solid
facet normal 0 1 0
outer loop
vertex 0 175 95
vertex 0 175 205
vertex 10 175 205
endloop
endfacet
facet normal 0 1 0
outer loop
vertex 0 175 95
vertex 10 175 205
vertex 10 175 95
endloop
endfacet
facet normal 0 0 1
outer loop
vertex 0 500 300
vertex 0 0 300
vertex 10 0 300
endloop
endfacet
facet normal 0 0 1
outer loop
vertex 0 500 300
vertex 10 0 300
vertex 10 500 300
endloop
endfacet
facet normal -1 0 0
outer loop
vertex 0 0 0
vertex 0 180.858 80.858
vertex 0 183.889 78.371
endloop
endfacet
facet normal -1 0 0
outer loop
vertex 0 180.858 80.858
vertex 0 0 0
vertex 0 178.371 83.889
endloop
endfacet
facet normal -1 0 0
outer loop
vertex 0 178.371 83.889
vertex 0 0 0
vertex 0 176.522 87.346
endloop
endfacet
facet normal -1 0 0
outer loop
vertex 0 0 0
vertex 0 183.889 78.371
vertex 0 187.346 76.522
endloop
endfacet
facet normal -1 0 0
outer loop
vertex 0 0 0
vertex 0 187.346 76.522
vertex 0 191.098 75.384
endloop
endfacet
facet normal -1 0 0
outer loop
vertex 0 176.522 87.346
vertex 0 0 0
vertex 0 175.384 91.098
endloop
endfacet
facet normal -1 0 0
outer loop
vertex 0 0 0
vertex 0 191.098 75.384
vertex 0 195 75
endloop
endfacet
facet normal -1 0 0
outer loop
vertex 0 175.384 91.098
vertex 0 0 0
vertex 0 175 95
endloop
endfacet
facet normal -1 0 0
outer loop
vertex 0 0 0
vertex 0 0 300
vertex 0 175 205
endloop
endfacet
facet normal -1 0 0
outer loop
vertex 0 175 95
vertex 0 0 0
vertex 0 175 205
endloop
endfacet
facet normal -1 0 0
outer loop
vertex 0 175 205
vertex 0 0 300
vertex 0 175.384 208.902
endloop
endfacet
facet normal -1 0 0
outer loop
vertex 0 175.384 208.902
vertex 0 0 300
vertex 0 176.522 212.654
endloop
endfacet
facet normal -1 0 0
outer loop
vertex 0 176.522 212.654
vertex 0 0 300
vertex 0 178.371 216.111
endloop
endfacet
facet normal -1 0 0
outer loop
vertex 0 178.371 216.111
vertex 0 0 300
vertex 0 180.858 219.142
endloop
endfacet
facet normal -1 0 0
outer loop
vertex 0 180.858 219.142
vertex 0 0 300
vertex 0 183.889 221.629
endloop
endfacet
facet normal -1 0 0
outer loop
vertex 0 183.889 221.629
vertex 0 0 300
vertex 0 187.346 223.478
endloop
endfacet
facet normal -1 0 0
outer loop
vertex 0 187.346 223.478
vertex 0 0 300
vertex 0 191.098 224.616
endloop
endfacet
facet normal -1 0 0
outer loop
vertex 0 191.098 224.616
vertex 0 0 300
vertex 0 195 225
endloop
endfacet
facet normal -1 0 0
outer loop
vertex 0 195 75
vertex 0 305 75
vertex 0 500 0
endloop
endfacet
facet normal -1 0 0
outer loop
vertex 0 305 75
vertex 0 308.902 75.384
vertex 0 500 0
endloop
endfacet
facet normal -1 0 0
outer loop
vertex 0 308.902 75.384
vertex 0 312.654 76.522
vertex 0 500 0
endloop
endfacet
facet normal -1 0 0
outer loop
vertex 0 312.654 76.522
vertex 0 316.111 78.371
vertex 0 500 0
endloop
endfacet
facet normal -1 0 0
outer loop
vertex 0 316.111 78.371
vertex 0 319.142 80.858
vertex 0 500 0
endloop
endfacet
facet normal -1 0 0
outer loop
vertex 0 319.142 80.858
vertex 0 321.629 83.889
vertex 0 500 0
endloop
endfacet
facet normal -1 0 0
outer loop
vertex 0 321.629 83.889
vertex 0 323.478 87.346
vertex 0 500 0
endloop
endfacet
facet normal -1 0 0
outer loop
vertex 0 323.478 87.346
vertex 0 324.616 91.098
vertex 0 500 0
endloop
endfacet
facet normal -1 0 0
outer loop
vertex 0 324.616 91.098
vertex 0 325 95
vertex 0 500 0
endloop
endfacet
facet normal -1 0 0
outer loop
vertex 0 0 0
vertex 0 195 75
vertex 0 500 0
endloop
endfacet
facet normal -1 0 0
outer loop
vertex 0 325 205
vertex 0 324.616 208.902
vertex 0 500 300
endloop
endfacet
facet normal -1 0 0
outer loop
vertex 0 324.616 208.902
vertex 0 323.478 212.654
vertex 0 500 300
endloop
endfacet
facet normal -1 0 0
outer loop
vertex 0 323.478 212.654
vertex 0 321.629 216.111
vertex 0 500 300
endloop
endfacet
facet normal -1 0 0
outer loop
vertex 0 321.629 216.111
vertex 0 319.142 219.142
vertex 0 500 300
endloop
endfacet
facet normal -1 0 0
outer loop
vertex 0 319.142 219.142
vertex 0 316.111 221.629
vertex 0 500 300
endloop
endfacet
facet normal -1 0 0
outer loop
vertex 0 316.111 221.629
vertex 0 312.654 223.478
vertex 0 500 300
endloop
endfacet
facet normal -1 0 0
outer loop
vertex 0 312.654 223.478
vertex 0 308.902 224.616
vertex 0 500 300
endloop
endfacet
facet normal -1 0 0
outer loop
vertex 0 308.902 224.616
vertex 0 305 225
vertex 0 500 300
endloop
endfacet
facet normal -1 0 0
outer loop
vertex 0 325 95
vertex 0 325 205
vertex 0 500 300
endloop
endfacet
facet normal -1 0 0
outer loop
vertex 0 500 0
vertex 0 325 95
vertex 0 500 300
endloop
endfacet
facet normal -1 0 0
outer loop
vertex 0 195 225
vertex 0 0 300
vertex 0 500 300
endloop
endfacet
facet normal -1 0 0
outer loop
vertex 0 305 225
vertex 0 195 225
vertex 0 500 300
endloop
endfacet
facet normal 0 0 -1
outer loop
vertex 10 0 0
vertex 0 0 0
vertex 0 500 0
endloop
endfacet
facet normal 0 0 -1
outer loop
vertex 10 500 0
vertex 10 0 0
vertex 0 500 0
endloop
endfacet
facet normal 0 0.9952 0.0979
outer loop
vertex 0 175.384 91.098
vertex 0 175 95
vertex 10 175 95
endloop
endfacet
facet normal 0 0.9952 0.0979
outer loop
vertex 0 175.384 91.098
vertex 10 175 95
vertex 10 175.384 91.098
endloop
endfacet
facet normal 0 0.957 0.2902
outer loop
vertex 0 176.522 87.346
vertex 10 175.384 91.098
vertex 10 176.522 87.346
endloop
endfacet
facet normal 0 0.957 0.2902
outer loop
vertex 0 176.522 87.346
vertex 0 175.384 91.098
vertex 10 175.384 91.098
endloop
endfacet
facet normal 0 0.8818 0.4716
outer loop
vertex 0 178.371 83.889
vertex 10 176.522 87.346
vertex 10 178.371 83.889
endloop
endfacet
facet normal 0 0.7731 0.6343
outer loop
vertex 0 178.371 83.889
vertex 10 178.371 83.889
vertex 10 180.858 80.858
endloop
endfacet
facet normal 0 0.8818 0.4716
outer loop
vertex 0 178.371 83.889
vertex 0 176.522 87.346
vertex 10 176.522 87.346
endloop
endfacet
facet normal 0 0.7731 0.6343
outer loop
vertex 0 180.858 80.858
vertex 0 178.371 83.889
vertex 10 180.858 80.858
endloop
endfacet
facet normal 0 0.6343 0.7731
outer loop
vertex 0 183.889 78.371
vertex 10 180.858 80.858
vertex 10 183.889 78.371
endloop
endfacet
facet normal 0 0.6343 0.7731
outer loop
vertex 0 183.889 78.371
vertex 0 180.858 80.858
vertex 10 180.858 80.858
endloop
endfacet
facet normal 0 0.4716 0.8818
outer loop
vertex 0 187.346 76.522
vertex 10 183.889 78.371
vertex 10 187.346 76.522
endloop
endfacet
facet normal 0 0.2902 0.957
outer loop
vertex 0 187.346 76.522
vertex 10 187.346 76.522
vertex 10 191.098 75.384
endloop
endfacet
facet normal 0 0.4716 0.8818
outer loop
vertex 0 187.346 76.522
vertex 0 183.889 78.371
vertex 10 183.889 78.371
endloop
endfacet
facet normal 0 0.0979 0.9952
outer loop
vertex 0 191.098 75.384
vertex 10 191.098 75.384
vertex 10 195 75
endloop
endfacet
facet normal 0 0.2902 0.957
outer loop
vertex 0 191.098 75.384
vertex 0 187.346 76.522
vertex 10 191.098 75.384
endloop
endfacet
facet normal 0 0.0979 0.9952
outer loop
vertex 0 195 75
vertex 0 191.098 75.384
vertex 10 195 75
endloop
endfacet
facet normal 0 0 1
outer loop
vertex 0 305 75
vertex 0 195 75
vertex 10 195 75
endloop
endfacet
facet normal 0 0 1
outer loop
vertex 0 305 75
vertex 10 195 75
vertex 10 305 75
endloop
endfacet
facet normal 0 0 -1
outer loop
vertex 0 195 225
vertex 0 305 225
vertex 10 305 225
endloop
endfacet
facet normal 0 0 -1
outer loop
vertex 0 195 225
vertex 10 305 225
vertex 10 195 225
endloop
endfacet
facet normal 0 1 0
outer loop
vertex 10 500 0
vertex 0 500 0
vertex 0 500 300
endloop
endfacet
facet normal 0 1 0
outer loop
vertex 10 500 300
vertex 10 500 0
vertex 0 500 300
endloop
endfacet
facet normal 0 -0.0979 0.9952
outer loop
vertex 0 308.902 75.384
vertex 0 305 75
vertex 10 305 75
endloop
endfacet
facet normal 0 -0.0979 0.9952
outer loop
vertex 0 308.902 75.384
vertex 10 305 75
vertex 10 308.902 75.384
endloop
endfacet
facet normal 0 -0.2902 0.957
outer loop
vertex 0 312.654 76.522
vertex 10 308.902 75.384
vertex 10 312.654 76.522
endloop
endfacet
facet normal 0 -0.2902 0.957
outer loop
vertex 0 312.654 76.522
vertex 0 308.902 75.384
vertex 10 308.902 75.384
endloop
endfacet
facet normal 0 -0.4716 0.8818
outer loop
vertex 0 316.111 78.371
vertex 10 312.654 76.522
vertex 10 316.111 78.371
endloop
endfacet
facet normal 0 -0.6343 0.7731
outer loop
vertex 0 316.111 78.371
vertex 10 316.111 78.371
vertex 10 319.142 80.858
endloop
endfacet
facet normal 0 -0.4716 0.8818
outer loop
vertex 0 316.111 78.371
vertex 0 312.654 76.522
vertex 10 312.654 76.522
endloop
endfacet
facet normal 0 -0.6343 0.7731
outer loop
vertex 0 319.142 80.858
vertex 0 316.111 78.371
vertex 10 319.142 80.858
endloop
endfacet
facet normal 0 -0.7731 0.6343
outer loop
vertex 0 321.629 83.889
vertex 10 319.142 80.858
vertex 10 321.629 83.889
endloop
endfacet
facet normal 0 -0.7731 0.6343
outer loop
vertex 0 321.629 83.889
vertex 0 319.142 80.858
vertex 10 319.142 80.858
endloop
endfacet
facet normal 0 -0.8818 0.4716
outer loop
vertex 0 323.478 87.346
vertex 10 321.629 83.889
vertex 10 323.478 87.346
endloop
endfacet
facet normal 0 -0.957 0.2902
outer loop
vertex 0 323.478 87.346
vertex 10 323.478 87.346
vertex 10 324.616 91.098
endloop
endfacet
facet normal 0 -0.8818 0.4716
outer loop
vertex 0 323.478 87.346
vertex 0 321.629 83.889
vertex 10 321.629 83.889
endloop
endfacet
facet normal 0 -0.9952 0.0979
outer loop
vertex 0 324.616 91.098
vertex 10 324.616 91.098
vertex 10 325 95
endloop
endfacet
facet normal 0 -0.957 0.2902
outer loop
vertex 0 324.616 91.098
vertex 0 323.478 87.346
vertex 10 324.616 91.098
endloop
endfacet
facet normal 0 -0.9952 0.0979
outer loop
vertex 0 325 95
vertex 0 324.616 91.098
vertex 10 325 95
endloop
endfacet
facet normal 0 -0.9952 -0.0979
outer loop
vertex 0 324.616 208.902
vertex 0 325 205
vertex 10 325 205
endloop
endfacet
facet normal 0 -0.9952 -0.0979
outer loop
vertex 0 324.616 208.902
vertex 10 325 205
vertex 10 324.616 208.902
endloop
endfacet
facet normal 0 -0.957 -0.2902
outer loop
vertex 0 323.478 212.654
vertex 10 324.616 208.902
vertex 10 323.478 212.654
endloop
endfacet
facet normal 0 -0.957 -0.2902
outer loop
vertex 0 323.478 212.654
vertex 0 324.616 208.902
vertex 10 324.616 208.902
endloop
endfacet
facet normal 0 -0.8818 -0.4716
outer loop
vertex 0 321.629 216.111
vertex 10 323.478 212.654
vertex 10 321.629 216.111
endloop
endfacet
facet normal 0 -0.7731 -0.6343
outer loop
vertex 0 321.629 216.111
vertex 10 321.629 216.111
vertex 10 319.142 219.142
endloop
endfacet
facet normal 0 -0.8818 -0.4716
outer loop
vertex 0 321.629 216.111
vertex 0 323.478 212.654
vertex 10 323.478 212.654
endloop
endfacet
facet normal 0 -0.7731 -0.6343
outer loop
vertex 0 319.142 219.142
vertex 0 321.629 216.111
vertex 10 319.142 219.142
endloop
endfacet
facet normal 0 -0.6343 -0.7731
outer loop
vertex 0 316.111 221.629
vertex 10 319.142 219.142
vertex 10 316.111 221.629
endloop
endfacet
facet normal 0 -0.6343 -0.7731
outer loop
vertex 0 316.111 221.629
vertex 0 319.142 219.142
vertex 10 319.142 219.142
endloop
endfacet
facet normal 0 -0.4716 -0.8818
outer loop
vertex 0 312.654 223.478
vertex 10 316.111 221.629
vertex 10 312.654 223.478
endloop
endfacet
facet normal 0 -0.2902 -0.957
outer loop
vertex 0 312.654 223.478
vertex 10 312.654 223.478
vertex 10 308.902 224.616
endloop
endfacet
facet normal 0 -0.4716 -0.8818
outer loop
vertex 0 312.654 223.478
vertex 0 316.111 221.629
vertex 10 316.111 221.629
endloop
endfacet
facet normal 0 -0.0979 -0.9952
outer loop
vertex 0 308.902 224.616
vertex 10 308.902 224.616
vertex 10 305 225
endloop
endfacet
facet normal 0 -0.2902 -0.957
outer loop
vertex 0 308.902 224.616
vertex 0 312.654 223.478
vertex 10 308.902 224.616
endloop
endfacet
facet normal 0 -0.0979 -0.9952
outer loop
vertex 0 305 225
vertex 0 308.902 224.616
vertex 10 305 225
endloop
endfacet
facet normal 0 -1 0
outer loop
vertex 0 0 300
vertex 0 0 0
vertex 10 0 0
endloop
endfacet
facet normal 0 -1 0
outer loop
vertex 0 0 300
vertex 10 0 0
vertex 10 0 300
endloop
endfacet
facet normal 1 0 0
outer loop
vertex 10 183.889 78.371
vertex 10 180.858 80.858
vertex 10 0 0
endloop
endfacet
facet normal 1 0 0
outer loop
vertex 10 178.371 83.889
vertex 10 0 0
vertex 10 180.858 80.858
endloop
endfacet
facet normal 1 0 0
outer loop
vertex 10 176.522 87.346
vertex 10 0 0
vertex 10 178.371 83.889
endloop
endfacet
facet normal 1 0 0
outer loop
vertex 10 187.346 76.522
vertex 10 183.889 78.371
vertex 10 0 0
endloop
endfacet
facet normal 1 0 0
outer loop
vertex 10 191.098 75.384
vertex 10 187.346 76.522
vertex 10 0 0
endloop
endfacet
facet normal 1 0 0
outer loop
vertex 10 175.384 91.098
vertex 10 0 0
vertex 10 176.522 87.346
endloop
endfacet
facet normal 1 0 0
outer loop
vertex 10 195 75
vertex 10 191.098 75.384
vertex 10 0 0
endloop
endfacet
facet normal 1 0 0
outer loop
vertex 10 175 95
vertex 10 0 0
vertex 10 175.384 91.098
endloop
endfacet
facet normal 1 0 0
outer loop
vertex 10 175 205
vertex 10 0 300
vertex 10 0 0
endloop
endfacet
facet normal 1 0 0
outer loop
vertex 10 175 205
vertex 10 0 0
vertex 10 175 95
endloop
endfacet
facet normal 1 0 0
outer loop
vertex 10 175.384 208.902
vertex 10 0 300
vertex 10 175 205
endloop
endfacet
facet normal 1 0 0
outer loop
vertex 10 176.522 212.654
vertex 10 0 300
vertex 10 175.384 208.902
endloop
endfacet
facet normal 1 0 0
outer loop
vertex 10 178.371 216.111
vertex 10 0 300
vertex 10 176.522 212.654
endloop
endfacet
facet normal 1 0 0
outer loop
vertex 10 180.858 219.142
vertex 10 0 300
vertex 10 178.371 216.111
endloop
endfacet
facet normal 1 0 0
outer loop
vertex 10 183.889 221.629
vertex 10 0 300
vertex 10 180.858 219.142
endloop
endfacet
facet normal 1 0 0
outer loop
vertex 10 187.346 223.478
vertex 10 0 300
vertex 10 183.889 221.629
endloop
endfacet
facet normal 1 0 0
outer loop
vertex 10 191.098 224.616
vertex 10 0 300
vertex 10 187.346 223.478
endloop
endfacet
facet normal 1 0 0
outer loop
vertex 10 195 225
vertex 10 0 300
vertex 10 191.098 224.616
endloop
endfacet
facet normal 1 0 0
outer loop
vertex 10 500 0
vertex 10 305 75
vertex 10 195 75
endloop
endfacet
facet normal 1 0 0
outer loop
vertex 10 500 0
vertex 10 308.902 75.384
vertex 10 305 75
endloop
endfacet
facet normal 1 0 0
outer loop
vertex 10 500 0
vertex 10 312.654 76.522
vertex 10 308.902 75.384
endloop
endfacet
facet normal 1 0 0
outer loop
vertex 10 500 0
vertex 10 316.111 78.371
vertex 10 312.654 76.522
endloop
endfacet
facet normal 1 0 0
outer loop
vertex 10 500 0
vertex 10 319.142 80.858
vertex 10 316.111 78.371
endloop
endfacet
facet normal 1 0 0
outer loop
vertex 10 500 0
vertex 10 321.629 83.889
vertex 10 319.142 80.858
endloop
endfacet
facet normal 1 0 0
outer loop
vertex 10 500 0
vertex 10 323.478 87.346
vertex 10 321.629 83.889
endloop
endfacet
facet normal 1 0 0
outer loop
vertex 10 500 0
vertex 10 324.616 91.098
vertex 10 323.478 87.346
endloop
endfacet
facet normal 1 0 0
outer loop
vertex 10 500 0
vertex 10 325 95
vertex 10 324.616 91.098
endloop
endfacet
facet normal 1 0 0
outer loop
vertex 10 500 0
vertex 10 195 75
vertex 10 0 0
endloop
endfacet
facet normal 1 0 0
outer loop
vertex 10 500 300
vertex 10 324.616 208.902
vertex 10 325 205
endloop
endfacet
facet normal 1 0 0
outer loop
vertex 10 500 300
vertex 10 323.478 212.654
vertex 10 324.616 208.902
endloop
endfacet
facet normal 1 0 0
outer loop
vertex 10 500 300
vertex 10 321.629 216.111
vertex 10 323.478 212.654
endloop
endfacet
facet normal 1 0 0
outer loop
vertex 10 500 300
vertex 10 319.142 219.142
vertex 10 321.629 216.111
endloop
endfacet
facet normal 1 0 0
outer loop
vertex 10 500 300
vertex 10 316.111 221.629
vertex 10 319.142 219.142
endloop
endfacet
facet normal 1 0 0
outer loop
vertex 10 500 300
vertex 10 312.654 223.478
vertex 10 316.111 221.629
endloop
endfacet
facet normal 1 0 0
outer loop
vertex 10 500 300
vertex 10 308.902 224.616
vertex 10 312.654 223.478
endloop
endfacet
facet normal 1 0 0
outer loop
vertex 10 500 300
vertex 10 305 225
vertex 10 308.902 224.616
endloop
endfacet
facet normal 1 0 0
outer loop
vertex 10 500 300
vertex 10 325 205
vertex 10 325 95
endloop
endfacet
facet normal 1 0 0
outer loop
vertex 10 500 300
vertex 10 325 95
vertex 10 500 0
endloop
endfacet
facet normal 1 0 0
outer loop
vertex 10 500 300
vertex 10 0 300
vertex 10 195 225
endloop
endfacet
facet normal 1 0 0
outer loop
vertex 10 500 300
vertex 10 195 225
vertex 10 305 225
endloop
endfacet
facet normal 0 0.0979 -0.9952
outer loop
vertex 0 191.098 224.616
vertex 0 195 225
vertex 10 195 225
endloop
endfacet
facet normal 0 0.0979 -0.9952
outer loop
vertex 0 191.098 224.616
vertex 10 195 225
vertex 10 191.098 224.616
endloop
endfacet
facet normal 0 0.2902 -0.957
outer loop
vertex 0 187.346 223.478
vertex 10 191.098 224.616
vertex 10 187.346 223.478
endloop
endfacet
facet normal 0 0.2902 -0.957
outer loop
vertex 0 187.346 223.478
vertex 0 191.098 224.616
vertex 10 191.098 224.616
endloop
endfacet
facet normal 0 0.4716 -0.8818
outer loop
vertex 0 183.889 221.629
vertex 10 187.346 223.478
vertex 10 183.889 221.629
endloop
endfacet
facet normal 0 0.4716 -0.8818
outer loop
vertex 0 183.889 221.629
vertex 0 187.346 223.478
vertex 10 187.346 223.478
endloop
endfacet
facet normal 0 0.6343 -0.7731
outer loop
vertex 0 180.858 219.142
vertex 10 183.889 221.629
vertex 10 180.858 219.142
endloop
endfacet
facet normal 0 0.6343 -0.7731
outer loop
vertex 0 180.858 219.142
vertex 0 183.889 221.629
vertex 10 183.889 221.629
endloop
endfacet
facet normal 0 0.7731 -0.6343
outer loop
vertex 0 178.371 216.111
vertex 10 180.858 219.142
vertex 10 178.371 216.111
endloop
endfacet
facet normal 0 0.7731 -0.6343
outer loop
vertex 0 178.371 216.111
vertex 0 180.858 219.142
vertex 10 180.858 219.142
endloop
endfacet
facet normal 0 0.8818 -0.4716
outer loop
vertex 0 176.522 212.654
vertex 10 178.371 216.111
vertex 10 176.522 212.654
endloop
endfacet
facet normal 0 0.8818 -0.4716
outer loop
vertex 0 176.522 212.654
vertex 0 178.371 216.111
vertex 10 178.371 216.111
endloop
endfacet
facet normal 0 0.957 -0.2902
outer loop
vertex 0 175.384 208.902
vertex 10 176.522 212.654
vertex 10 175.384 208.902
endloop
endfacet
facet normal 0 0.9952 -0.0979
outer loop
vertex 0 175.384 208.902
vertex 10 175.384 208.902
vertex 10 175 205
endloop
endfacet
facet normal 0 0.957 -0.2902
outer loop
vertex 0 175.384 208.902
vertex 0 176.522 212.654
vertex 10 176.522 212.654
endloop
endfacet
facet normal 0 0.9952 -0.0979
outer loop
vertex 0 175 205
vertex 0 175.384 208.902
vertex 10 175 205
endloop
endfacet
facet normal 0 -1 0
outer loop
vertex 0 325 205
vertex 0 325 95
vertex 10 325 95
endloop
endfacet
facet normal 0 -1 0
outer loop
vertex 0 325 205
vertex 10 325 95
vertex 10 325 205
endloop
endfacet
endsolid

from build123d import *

# Parameters (mm, degrees)
SKETCH1_W           = 500
SKETCH1_H           = 300
BOSS_EXTRUDE1_DEPTH = 10


with BuildPart() as part:
    # Sketch1 → Boss-Extrude1 (new body)
    with BuildSketch(Plane.YZ):
        with Locations((250, 150)):
            Rectangle(SKETCH1_W, SKETCH1_H)
        with BuildLine():
            Line((195, 75), (305, 75))
            ThreePointArc((305, 75), (319.142135624, 80.857864376), (325, 95))
            Line((325, 95), (325, 205))
            ThreePointArc((325, 205), (319.142135624, 219.142135624), (305, 225))
            Line((305, 225), (195, 225))
            ThreePointArc((195, 225), (180.857864376, 219.142135624), (175, 205))
            Line((175, 205), (175, 95))
            ThreePointArc((175, 95), (180.857864376, 80.857864376), (195, 75))
        make_face(mode=Mode.SUBTRACT)
    extrude(amount=BOSS_EXTRUDE1_DEPTH)


solid = part.part
